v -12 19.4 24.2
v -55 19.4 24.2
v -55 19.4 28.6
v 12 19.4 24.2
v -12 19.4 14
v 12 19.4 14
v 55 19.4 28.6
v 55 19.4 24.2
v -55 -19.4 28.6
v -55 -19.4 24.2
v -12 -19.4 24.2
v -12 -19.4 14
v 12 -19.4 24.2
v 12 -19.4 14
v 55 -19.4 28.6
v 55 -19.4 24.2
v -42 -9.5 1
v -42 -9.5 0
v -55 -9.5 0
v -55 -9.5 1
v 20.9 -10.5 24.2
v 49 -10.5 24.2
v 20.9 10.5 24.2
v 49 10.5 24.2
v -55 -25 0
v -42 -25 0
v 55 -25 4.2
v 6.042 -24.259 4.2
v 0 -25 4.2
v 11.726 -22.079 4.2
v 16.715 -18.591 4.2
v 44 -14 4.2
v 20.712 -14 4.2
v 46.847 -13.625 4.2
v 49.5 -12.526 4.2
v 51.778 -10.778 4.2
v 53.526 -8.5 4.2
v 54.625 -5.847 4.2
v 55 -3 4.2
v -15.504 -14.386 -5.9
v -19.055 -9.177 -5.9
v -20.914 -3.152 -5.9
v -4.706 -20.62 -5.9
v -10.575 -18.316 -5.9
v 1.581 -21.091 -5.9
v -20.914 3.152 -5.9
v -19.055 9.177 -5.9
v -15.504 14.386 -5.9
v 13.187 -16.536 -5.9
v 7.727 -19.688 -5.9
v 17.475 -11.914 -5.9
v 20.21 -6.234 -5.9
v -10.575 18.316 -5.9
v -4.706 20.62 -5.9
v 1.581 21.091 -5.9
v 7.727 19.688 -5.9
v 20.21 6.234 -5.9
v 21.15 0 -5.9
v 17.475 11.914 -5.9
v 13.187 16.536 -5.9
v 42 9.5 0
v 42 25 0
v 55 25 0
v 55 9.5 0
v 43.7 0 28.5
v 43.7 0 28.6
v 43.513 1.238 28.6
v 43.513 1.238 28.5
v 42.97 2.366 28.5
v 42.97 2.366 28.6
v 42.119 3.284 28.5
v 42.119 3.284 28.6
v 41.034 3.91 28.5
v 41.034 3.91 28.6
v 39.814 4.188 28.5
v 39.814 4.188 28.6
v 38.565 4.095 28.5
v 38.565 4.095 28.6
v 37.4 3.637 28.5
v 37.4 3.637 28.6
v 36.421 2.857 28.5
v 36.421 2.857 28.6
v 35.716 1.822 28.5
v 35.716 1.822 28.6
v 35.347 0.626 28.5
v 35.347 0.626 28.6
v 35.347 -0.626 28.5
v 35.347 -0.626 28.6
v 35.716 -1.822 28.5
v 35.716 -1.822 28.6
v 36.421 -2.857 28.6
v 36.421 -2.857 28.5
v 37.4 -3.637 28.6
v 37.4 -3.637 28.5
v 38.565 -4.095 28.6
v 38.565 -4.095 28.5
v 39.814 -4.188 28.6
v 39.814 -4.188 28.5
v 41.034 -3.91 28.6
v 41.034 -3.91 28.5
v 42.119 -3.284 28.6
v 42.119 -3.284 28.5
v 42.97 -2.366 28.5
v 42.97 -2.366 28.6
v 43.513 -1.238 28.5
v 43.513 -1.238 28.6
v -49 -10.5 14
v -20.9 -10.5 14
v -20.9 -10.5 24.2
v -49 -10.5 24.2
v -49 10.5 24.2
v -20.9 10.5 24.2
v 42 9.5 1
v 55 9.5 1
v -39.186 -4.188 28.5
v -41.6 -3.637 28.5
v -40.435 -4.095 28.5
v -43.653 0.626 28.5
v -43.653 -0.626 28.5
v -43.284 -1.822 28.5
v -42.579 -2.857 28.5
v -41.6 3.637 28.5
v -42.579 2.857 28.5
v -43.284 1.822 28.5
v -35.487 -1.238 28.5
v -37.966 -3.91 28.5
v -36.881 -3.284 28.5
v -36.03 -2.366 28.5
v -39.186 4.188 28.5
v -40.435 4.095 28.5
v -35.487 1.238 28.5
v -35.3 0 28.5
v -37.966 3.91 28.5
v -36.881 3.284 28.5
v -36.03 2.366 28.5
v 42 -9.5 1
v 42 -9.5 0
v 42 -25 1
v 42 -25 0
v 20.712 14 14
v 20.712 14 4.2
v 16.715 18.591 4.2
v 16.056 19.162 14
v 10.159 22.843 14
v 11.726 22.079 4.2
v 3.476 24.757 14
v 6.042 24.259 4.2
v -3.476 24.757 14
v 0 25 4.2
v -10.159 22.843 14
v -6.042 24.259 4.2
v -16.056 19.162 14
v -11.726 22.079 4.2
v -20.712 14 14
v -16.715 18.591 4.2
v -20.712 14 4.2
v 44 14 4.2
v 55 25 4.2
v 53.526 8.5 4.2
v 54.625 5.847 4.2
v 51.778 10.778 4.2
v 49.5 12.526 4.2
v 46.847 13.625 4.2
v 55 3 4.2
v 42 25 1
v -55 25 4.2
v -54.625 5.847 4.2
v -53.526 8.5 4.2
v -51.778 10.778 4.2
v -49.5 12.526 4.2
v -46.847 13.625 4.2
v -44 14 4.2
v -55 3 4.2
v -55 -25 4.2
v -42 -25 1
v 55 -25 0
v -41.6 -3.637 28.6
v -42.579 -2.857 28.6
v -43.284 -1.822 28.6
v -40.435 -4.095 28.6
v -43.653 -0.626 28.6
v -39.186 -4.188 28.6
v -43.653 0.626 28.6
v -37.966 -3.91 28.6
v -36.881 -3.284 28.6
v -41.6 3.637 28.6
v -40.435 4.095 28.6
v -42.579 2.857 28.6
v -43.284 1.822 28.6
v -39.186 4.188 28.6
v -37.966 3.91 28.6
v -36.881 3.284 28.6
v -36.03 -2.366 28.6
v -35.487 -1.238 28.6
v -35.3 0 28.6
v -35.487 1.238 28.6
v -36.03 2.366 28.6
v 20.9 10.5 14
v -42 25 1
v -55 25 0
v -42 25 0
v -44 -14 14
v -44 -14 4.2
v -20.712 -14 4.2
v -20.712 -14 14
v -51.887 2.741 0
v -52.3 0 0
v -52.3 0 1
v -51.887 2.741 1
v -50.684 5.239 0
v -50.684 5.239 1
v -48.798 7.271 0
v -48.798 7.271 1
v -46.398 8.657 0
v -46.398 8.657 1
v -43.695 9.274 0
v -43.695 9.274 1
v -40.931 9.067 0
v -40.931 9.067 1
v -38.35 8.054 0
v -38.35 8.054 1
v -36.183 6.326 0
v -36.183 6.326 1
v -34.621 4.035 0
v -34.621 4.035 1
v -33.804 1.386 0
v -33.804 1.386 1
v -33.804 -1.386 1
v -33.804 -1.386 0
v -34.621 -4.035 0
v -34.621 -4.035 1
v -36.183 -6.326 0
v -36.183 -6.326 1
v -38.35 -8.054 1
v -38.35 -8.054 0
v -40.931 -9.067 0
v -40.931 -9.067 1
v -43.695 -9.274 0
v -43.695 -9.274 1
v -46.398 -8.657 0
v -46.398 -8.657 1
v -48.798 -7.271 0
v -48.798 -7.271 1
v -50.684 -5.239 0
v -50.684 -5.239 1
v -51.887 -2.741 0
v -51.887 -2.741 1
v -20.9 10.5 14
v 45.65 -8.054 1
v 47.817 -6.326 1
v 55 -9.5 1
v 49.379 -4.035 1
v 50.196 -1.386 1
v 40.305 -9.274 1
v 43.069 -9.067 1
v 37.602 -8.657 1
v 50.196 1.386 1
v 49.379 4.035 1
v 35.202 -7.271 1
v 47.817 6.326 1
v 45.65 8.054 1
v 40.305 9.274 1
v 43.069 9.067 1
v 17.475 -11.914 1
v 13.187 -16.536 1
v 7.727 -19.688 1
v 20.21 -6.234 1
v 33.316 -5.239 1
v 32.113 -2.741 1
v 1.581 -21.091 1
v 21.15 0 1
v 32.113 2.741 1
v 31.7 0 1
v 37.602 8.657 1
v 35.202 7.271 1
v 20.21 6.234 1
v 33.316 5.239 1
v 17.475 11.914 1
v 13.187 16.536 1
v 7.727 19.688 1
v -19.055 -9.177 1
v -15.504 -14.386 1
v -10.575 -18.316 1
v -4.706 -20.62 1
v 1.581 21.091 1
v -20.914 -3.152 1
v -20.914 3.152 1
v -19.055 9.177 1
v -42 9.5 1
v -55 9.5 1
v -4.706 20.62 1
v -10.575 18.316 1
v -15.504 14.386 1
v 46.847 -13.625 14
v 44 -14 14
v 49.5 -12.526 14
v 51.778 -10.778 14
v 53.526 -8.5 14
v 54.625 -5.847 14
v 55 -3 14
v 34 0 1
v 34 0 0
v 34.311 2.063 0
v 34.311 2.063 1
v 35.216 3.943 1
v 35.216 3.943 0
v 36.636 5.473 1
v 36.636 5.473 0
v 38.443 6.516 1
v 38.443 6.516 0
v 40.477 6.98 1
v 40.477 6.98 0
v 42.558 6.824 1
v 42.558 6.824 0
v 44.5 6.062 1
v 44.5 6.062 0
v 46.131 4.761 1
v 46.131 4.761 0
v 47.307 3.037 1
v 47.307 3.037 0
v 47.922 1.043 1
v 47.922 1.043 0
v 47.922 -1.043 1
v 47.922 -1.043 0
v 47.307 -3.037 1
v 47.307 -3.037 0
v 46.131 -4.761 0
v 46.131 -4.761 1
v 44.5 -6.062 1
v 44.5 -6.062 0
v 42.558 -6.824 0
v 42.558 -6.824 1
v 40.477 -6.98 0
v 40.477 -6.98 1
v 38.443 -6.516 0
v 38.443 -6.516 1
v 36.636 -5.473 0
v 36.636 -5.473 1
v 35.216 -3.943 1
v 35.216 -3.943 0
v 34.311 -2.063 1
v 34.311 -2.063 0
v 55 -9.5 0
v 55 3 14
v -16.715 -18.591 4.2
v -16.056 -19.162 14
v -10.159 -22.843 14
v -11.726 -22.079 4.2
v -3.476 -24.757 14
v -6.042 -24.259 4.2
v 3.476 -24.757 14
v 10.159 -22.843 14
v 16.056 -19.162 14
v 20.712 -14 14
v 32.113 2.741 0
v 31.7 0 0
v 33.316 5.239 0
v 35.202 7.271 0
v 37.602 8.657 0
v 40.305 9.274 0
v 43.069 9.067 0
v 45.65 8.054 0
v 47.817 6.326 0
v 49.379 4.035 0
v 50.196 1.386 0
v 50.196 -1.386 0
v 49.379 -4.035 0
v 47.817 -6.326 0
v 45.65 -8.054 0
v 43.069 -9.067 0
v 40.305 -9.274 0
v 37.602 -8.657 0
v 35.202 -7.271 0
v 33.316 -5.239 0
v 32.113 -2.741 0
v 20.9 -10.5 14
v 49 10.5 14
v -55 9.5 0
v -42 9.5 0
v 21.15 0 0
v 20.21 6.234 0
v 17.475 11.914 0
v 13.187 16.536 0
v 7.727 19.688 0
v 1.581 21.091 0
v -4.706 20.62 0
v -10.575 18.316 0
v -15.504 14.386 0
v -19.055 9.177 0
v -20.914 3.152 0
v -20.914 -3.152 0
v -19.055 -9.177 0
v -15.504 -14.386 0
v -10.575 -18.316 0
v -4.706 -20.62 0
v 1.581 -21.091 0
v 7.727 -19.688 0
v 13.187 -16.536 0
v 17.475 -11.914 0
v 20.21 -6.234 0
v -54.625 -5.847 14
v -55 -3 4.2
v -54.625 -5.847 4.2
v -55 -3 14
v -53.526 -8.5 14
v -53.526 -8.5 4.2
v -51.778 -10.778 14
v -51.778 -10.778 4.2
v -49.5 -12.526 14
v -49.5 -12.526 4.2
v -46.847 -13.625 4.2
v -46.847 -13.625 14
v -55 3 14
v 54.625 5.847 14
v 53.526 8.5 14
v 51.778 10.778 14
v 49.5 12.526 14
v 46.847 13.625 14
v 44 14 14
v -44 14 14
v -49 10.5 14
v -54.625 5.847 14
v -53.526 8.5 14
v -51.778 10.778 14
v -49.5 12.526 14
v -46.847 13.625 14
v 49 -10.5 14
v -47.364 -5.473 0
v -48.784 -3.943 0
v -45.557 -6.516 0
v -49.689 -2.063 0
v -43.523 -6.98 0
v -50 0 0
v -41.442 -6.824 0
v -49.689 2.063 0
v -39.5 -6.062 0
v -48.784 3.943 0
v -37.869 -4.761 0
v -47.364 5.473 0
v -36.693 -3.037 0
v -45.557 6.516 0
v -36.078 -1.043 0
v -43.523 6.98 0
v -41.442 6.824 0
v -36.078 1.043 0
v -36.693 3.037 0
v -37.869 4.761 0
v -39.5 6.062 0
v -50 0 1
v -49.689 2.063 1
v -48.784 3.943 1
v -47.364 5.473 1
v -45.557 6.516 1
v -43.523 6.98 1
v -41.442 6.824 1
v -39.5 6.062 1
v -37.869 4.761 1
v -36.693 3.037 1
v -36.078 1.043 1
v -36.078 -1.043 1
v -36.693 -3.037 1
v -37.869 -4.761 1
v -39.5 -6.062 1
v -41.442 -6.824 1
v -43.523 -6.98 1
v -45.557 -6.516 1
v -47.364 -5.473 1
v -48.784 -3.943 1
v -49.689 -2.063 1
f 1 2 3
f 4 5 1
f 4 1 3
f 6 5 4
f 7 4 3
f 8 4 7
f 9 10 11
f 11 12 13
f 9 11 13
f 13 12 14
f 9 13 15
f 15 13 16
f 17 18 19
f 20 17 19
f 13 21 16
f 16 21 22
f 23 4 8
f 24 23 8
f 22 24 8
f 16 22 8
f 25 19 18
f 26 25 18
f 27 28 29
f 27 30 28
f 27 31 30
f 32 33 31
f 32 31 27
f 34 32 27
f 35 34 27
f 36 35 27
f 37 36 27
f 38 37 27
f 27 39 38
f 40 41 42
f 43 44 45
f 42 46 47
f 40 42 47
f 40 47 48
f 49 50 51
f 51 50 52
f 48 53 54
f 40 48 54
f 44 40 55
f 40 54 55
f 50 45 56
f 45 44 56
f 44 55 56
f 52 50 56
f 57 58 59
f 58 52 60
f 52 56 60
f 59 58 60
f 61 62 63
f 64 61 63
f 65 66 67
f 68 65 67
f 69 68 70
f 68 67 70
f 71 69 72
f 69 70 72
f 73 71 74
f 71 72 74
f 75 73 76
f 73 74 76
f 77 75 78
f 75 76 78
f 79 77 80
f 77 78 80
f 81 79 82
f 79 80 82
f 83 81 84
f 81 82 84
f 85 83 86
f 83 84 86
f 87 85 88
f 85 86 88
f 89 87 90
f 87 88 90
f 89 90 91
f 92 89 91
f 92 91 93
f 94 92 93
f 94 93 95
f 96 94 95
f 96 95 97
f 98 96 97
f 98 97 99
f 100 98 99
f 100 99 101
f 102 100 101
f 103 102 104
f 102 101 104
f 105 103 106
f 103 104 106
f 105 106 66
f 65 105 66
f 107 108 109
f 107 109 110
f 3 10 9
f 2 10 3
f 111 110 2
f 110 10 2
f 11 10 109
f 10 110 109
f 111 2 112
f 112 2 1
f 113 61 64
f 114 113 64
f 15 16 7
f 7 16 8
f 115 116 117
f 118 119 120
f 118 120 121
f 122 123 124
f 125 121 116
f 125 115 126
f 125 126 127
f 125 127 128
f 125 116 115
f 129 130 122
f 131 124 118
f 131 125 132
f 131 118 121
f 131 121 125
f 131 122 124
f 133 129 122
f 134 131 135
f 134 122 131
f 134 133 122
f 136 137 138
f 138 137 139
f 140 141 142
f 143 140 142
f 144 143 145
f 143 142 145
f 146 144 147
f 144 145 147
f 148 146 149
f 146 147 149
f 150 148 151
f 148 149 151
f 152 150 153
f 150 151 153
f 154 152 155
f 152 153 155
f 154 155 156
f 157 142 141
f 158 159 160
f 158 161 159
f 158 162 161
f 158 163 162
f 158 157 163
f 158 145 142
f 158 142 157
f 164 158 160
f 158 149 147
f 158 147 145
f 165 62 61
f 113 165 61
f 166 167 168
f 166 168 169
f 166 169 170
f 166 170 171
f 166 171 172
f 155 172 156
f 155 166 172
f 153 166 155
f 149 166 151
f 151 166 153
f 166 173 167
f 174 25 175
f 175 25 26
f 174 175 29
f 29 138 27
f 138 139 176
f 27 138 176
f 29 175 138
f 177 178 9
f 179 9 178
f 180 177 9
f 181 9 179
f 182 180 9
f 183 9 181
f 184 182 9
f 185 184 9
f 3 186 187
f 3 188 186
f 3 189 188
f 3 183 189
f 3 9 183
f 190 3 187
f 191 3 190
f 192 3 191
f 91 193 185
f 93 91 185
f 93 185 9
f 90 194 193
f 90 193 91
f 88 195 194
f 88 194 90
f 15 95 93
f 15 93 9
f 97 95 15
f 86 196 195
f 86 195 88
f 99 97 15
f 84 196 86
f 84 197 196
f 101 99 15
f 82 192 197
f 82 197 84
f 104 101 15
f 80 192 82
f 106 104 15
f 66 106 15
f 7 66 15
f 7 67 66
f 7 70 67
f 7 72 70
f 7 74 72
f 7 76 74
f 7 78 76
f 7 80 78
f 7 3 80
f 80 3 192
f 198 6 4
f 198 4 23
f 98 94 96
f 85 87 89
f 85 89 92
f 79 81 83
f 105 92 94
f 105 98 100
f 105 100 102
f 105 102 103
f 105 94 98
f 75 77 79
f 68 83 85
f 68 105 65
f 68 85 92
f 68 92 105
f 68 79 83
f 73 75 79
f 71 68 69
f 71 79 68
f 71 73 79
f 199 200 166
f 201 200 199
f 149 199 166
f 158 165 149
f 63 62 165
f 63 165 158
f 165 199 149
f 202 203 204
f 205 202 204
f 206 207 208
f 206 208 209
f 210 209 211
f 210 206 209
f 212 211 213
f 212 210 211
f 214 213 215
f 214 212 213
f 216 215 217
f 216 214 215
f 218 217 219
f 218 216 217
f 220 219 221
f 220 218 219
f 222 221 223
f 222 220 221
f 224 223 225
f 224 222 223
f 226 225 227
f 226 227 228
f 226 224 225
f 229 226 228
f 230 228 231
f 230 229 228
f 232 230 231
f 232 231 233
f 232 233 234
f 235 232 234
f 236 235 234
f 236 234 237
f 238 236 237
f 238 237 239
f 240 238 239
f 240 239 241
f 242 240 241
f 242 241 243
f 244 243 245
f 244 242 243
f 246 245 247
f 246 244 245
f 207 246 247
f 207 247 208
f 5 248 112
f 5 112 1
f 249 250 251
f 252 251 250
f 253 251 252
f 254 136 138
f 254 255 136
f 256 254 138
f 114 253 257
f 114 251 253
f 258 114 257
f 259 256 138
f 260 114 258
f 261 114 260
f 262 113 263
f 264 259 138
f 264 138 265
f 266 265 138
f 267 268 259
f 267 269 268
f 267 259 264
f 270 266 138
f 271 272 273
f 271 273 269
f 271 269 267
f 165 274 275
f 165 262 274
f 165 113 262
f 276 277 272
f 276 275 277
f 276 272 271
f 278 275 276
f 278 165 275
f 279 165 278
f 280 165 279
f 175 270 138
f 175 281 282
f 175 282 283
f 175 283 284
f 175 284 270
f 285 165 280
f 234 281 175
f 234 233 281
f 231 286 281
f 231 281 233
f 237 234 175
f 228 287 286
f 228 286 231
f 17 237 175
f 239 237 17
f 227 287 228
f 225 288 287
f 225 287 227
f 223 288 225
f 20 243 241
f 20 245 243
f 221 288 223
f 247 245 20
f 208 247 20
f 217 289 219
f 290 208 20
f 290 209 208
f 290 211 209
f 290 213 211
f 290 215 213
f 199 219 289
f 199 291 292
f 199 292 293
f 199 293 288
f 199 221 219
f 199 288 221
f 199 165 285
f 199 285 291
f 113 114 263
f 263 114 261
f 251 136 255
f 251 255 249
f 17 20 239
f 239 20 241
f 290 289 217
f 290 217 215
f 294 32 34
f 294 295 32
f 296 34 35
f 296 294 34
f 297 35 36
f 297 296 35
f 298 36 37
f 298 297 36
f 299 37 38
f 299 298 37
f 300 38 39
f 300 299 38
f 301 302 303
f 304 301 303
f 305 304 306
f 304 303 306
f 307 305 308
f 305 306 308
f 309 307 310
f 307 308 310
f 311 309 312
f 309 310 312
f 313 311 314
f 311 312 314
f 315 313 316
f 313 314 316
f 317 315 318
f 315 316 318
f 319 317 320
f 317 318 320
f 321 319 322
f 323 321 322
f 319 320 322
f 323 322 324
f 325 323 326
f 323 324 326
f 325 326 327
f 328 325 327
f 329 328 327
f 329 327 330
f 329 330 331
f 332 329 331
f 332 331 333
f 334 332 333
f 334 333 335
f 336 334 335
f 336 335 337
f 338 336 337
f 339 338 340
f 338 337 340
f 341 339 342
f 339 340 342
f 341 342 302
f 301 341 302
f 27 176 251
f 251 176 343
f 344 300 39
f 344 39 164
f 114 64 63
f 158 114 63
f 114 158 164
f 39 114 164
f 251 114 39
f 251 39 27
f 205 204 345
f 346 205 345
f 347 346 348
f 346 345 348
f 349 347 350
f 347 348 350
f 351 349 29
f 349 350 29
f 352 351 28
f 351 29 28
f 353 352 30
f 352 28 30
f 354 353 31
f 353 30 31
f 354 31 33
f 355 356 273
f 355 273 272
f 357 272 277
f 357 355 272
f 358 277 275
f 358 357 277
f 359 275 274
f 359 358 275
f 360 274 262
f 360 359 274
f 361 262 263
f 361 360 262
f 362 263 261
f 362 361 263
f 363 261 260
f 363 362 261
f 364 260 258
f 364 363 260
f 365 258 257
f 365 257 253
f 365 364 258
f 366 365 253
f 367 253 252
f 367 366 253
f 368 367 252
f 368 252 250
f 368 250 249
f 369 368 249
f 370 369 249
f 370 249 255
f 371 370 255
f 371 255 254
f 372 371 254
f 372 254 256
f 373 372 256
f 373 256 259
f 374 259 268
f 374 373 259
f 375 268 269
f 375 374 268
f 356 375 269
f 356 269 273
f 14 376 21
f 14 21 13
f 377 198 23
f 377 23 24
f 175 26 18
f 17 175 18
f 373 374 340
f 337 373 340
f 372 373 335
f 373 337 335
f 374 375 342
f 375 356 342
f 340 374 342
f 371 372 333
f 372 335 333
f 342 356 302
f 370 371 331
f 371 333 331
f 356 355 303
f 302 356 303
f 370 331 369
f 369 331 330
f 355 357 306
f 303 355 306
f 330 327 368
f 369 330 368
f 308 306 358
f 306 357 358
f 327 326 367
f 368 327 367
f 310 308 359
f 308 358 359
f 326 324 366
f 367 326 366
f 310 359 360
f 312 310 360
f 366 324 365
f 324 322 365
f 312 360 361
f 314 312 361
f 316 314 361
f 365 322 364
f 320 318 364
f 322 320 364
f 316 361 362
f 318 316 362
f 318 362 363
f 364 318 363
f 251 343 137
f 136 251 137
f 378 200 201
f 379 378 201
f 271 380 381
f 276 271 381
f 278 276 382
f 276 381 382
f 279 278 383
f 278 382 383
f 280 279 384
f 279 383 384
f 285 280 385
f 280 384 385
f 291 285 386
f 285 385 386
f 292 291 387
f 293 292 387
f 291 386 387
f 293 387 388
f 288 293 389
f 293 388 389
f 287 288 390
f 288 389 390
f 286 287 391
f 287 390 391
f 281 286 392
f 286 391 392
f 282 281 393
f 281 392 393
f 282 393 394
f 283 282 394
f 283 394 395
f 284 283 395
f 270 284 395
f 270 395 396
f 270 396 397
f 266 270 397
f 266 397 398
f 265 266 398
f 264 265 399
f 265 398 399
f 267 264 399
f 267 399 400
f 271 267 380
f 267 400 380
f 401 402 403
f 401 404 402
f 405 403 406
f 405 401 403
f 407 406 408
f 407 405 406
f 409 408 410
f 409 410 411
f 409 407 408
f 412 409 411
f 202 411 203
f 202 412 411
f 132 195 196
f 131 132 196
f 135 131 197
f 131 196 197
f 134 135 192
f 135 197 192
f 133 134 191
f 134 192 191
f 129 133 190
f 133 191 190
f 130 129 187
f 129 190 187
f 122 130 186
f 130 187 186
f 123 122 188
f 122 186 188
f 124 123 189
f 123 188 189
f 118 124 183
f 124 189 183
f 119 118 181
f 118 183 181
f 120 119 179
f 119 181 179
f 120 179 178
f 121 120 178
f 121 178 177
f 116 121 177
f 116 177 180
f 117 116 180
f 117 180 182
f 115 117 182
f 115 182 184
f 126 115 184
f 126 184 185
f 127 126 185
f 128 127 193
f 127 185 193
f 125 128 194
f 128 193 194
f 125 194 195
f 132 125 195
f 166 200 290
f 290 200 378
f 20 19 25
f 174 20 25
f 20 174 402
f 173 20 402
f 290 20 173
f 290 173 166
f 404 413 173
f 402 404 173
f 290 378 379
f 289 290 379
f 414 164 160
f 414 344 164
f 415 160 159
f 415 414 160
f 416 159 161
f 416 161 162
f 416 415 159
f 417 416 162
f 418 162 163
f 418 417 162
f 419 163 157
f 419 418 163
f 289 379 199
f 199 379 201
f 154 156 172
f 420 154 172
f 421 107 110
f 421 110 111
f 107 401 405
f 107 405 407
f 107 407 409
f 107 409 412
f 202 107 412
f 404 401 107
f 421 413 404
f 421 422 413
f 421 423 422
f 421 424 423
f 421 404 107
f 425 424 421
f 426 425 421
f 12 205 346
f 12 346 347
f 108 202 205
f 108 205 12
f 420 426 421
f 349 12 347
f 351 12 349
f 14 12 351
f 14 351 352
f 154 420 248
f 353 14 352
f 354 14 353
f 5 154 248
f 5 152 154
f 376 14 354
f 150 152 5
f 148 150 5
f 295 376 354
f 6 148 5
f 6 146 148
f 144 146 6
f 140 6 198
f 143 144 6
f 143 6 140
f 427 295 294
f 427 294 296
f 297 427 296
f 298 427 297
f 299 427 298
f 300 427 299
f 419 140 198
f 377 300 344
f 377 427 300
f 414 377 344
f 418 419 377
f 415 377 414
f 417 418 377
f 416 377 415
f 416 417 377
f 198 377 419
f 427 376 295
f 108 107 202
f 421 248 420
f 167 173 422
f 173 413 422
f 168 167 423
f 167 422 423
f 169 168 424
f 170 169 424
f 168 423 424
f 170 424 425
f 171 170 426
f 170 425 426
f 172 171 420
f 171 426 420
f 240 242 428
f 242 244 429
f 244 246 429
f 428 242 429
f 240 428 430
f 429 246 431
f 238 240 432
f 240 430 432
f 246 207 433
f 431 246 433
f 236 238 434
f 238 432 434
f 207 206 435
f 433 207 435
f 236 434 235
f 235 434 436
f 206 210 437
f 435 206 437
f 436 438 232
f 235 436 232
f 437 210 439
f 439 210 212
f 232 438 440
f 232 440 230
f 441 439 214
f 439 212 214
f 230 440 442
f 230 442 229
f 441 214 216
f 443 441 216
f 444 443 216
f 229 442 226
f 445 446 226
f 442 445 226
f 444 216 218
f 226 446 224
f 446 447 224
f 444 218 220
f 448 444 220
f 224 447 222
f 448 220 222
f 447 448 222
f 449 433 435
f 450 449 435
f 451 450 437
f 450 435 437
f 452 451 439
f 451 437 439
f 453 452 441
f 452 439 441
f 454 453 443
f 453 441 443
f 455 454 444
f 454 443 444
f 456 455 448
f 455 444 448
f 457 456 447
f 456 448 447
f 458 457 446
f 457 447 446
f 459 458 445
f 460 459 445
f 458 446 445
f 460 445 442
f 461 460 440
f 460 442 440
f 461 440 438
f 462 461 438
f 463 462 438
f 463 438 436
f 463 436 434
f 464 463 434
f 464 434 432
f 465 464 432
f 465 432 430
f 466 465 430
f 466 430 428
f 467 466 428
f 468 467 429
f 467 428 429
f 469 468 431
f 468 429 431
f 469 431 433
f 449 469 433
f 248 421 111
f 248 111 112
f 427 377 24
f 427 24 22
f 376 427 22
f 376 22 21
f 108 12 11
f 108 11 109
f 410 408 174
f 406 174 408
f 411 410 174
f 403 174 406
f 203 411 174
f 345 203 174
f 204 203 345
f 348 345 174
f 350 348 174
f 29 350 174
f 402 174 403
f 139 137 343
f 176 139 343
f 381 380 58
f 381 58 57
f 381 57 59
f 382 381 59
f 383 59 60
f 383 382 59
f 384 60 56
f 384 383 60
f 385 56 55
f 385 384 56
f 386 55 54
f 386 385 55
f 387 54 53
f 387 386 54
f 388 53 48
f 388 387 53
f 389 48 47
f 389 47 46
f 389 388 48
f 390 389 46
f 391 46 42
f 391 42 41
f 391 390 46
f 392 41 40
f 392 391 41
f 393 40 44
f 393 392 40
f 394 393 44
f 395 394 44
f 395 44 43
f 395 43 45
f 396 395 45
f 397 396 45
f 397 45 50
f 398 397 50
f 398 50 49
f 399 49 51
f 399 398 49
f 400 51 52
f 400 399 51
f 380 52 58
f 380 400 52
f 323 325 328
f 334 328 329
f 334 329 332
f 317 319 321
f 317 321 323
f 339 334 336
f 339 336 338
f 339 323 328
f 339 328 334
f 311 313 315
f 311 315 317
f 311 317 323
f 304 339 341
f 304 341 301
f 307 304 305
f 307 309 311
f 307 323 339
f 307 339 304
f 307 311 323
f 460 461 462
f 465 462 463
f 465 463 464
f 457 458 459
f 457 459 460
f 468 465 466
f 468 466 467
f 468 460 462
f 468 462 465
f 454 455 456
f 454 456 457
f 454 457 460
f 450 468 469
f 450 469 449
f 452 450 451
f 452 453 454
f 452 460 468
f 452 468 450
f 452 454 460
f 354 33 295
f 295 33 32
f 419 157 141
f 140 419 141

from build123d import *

# Parameters (mm, degrees)
SZKIC1_W                    = 110
SZKIC1_H                    = 50
DODANIE_WYCI_GNI_CIE1_DEPTH = 4.2
SZKIC2_R                    = 21.15
DODANIE_WYCI_GNI_CIE2_DEPTH = 5.9
DODANIE_WYCI_GNI_CIE3_DEPTH = 9.8
ZAOKR_GLENIE1_R             = 11
DODANIE_WYCI_GNI_CIE4_DEPTH = 10.2
SZKIC5_W                    = 110
SZKIC5_H                    = 38.8
DODANIE_WYCI_GNI_CIE5_DEPTH = 4.4
SZKIC6_R                    = 4.2
WYTNIJ_WYCI_GNI_CIE1_DEPTH  = 0.1
SZKIC7_R                    = 9.3
SZKIC7_R_2                  = 7
WYTNIJ_WYCI_GNI_CIE2_DEPTH  = 1


with BuildPart() as part:
    # Szkic1 → Dodanie-wyciągnięcie1 (new body)
    with BuildSketch(Plane.XY):
        Rectangle(SZKIC1_W, SZKIC1_H)
    extrude(amount=DODANIE_WYCI_GNI_CIE1_DEPTH)

    # Szkic2 → Dodanie-wyciągnięcie2 (add)
    with BuildSketch(Plane.XY):
        Circle(SZKIC2_R)
    extrude(amount=-DODANIE_WYCI_GNI_CIE2_DEPTH)

    # Szkic3 → Dodanie-wyciągnięcie3 (add)
    with BuildSketch(Plane.XY.offset(4.2)):
        with BuildLine():
            Line((-55, 14), (-55, -14))
            Line((-55, -14), (-20.712315177, -14))
            ThreePointArc((-20.712315177, -14), (-25, 0), (-20.712315177, 14))
            Line((-20.712315177, 14), (-55, 14))
        make_face()
        with BuildLine():
            ThreePointArc((-20.712315177, 14), (-25, 0), (-20.712315177, -14))
            Line((-20.712315177, -14), (20.712315177, -14))
            ThreePointArc((20.712315177, -14), (23.904056972, -7.32093302), (25, 0))
            ThreePointArc((25, 0), (23.904056972, 7.32093302), (20.712315177, 14))
            Line((20.712315177, 14), (-20.712315177, 14))
        make_face()
        with BuildLine():
            ThreePointArc((20.712315177, 14), (0, 25), (-20.712315177, 14))
            Line((-20.712315177, 14), (20.712315177, 14))
        make_face()
        with BuildLine():
            ThreePointArc((25, 0), (23.904056972, -7.32093302), (20.712315177, -14))
            Line((20.712315177, -14), (55, -14))
            Line((55, -14), (55, 14))
            Line((55, 14), (20.712315177, 14))
            ThreePointArc((20.712315177, 14), (23.904056972, 7.32093302), (25, 0))
        make_face()
        with BuildLine():
            Line((20.712315177, -14), (-20.712315177, -14))
            ThreePointArc((-20.712315177, -14), (0, -25), (20.712315177, -14))
        make_face()
    extrude(amount=DODANIE_WYCI_GNI_CIE3_DEPTH)

    # Zaokrąglenie1
    zaokr_glenie1_edges = [part.edges().sort_by_distance(p)[0] for p in [
        (-55, -14, 9.1),
        (55, -14, 9.1),
        (55, 14, 9.1),
        (-55, 14, 9.1),
    ]]
    fillet(zaokr_glenie1_edges, radius=ZAOKR_GLENIE1_R)

    # Szkic4 → Dodanie-wyciągnięcie4 (add)
    with BuildSketch(Plane.XY.offset(14)):
        Polygon((12, 19.4), (20.9, 10.5), (49, 10.5), (49, -10.5), (20.9, -10.5), (12, -19.4), (-12, -19.4), (-20.9, -10.5), (-49, -10.5), (-49, 10.5), (-20.9, 10.5), (-12, 19.4), align=None)
    extrude(amount=DODANIE_WYCI_GNI_CIE4_DEPTH)

    # Szkic5 → Dodanie-wyciągnięcie5 (add)
    with BuildSketch(Plane.XY.offset(24.2)):
        Rectangle(SZKIC5_W, SZKIC5_H)
    extrude(amount=DODANIE_WYCI_GNI_CIE5_DEPTH)

    # Szkic6 → Wytnij-wyciągnięcie1 (cut)
    with BuildSketch(Plane.XY.offset(28.6)):
        with Locations((-39.5, 0)):
            Circle(SZKIC6_R)
        with Locations((39.5, 0)):
            Circle(SZKIC6_R)
    extrude(amount=-WYTNIJ_WYCI_GNI_CIE1_DEPTH, mode=Mode.SUBTRACT)

    # Szkic7 → Wytnij-wyciągnięcie2 (cut)
    with BuildSketch(Plane(origin=(0, 0, 0), x_dir=(-1, 0, 0), z_dir=(0, 0, -1))):
        Polygon((42, 9.5), (42, 25), (-42, 25), (-42, 9.5), (-55, 9.5), (-55, -9.5), (-42, -9.5), (-42, -25), (42, -25), (42, -9.5), (55, -9.5), (55, 9.5), align=None)
        with Locations((-41, 0)):
            Circle(SZKIC7_R, mode=Mode.SUBTRACT)
        with BuildLine():
            ThreePointArc((21.15, 0), (0, -21.15), (-21.15, 0))
            ThreePointArc((-21.15, 0), (0, 21.15), (21.15, 0))
        make_face(mode=Mode.SUBTRACT)
        with Locations((43, 0)):
            Circle(SZKIC7_R, mode=Mode.SUBTRACT)
        with Locations((43, 0)):
            Circle(SZKIC7_R_2)
        with Locations((-41, 0)):
            Circle(SZKIC7_R_2)
    extrude(amount=-WYTNIJ_WYCI_GNI_CIE2_DEPTH, mode=Mode.SUBTRACT)


solid = part.part
